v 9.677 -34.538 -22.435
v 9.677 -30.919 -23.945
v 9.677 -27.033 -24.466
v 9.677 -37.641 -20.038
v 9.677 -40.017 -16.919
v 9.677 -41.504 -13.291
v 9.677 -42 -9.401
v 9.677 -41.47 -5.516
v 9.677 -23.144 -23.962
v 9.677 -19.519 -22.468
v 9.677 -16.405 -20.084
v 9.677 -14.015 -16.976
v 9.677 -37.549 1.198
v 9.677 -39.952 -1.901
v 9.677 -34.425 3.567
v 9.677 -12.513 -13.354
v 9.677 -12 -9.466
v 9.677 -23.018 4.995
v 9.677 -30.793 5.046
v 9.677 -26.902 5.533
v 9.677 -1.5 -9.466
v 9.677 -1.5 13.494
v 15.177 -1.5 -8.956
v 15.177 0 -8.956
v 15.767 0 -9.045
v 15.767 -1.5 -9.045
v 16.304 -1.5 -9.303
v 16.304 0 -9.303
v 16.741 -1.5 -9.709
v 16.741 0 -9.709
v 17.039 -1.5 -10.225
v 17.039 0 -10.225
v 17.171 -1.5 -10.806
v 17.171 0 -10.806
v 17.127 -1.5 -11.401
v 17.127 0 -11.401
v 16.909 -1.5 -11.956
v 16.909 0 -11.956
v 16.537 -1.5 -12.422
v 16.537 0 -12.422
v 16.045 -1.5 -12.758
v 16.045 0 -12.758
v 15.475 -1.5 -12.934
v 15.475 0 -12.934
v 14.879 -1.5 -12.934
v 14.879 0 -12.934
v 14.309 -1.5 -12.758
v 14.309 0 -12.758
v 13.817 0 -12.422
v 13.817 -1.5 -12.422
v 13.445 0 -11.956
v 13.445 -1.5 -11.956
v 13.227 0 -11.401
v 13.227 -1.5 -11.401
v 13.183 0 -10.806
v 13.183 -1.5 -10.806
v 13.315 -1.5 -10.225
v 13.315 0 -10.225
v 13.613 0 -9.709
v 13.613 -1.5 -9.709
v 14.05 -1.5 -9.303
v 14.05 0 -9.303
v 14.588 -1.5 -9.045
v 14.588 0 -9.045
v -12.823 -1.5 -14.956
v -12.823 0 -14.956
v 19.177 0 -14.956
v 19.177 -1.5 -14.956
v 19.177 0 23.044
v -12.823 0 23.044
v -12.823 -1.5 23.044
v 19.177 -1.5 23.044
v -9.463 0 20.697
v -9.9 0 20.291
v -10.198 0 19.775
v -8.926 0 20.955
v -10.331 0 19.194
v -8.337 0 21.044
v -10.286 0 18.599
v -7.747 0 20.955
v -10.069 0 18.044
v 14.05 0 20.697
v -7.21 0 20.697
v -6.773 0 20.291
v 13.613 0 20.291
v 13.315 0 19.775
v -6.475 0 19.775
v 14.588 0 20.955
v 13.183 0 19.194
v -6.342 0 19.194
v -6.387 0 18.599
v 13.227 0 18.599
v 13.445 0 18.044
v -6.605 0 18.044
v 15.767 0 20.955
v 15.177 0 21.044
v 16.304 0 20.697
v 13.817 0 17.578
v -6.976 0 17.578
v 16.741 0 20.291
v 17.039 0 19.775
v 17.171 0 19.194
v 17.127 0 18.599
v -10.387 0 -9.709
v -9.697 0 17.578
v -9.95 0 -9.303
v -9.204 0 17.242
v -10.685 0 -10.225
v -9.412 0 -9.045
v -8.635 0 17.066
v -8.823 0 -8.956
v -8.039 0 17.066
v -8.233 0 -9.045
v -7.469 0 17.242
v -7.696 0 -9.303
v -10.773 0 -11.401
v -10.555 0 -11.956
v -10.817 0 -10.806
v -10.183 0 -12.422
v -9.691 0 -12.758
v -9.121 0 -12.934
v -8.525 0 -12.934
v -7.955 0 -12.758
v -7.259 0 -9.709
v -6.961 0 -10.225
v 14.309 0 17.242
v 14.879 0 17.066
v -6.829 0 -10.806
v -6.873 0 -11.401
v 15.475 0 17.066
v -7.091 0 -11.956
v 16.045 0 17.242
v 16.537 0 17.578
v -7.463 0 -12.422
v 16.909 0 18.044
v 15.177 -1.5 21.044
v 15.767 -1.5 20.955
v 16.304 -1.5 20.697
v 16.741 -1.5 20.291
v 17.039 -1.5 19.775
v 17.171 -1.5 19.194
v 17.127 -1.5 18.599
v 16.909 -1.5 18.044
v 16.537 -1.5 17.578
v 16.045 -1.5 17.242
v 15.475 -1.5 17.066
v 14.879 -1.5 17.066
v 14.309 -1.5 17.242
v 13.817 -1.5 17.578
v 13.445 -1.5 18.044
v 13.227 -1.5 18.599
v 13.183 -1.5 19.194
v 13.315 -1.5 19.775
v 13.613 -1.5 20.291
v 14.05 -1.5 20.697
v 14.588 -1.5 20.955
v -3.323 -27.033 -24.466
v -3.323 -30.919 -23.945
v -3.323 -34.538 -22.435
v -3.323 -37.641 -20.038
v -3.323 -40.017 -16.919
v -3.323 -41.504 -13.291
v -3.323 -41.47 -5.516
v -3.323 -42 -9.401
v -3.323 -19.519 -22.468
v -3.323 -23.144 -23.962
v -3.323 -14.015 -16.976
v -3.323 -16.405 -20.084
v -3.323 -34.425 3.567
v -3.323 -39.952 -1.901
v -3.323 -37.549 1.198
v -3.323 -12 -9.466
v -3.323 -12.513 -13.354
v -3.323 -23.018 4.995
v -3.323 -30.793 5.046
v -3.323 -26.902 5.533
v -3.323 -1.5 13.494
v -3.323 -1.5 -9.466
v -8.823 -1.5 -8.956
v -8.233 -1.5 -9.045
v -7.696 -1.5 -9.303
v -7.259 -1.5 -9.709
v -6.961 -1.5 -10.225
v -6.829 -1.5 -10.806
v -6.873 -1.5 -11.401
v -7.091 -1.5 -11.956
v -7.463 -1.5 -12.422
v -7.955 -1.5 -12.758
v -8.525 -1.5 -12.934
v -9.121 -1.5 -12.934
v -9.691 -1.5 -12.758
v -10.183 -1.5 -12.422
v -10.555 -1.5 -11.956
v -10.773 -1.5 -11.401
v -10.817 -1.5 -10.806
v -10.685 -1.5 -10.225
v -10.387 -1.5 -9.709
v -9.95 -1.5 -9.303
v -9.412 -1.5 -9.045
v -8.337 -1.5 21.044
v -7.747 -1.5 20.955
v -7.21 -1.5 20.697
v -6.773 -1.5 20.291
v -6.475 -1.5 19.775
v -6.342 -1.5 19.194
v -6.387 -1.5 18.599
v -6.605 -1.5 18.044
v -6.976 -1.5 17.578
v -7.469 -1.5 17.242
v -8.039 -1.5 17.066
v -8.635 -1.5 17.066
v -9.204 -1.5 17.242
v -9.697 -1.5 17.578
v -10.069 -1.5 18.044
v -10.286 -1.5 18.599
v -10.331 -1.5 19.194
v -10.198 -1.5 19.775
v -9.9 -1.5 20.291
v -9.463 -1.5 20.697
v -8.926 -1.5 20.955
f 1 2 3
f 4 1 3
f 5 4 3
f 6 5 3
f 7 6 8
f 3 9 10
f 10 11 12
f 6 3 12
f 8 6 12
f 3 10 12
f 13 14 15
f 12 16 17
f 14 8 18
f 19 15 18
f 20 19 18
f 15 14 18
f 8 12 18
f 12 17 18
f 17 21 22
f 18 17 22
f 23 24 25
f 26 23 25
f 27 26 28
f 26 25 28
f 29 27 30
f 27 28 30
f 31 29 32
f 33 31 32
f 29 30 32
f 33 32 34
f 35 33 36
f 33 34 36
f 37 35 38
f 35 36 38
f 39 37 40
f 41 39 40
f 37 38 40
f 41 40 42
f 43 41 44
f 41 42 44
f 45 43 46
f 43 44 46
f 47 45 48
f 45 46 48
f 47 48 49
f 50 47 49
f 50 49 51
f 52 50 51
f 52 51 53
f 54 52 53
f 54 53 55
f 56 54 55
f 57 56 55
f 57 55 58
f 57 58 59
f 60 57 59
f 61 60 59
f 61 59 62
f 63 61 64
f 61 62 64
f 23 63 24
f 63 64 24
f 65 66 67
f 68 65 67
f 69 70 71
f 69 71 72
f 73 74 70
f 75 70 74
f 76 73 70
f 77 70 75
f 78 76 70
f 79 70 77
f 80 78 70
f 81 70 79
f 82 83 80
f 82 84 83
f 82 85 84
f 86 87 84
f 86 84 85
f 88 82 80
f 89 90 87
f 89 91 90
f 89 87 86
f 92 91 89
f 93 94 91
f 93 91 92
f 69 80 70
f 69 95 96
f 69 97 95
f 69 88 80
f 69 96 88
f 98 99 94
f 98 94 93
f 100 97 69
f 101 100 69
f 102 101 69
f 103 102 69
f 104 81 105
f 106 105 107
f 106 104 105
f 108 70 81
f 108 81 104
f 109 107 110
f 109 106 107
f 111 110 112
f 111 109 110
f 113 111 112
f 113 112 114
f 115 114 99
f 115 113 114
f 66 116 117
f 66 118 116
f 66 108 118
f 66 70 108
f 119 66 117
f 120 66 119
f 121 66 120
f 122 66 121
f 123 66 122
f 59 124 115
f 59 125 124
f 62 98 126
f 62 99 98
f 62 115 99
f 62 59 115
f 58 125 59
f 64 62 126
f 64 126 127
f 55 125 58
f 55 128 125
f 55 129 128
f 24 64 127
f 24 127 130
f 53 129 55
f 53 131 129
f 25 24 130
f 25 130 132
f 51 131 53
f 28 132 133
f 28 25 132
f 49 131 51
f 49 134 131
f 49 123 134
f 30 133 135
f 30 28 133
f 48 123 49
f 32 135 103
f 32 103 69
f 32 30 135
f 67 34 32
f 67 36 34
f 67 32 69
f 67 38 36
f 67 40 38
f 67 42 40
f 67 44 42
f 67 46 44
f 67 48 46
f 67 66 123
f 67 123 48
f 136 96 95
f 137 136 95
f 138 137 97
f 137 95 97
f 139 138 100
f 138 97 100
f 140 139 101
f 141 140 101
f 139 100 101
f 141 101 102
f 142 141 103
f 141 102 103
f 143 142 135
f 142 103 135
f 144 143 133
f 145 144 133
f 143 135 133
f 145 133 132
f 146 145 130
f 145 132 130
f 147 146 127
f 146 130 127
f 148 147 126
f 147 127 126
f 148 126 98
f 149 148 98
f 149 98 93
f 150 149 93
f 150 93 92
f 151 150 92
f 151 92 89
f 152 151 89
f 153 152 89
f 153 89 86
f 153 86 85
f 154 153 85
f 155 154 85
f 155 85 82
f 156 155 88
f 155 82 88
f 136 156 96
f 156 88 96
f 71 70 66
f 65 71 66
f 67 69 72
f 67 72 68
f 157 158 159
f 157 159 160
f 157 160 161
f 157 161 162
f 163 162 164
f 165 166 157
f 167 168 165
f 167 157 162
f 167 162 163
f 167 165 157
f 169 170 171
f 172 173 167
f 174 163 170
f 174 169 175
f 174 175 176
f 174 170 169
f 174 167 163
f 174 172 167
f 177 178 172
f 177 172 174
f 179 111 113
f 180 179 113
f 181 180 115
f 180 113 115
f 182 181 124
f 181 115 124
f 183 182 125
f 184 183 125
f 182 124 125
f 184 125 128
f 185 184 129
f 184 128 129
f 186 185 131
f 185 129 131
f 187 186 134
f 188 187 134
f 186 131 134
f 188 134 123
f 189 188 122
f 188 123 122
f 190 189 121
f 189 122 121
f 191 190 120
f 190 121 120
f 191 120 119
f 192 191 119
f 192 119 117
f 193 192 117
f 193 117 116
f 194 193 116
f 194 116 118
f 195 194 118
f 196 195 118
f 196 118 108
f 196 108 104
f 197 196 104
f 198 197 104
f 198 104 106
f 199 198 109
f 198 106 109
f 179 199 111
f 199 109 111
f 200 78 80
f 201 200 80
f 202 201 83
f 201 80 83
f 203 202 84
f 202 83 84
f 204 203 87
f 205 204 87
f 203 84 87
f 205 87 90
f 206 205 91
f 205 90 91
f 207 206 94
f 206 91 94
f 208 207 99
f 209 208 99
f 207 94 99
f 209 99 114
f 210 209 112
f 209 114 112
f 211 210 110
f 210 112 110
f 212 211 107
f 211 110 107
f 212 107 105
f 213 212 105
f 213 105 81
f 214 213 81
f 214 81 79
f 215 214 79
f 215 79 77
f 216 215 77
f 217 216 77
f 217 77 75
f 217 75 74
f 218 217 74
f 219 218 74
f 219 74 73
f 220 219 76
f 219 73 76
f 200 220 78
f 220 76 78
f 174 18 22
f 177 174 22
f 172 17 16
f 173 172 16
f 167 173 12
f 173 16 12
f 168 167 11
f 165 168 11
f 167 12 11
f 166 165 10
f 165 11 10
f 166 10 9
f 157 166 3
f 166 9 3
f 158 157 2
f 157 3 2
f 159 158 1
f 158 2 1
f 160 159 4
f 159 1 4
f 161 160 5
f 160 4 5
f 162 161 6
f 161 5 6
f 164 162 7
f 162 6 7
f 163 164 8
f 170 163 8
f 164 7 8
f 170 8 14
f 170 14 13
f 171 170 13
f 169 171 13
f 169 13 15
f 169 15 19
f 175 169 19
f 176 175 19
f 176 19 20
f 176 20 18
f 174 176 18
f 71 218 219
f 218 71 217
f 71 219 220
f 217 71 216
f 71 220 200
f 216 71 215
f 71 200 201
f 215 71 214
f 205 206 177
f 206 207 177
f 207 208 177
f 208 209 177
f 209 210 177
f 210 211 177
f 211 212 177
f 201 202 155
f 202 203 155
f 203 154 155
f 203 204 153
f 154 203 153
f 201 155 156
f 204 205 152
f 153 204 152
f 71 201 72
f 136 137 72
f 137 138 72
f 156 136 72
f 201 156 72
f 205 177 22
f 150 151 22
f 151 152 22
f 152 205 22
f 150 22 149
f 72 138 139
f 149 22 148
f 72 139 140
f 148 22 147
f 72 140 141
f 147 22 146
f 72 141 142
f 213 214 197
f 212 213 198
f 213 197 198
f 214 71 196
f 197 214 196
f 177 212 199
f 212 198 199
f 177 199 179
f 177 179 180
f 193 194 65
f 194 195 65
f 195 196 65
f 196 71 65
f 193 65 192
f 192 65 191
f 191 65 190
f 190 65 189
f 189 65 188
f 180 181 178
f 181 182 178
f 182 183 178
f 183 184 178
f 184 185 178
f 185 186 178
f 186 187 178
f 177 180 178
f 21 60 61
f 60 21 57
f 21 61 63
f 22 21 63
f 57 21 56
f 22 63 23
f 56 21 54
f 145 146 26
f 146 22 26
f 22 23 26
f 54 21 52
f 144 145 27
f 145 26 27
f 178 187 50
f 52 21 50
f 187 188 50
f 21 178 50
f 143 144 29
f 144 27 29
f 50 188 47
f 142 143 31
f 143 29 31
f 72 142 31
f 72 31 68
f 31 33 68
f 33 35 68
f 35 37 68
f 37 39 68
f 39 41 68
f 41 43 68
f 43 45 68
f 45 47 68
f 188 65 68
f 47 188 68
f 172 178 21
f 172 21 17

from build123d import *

# Parameters (mm, degrees)
SKETCH1_W                = 32
SKETCH1_H                = 38
SKETCH1_R                = 2
BOSS_EXTRUDE1_DEPTH      = 1.5
BOSS_EXTRUDE2_DEPTH      = 6.5
BOSS_EXTRUDE2_DEPTH_BACK = 6.5
SKETCH2_R                = 15


with BuildPart() as part:
    # Sketch1 → Boss-Extrude1 (new body)
    with BuildSketch(Plane(origin=(0, 0, 0), x_dir=(1, 0, 0), z_dir=(0, 1, 0))):
        with Locations((3.177060701, -4.044161192)):
            Rectangle(SKETCH1_W, SKETCH1_H)
        with Locations(Location((-8.822939299, 10.955838808, 0), (0, 0, 270))):
            Circle(SKETCH1_R, mode=Mode.SUBTRACT)
        with Locations(Location((15.177060701, 10.955838808, 0), (0, 0, 270))):
            Circle(SKETCH1_R, mode=Mode.SUBTRACT)
        with Locations(Location((15.177060701, -19.044161192, 0), (0, 0, 270))):
            Circle(SKETCH1_R, mode=Mode.SUBTRACT)
        with Locations(Location((-8.33660746, -19.044161192, 0), (0, 0, 270))):
            Circle(SKETCH1_R, mode=Mode.SUBTRACT)
    extrude(amount=-BOSS_EXTRUDE1_DEPTH)

    # Sketch2 → Boss-Extrude2 (add, two sides: drawn at the far end of the back side and taken through both)
    with BuildSketch(Plane.ZY.offset(-3.177060701).offset(-BOSS_EXTRUDE2_DEPTH_BACK)):
        with Locations((-9.466353074, -27)):
            Circle(SKETCH2_R)
        with BuildLine():
            Line((13.494241004, -1.5), (-9.466353074, -1.5))
            Line((-9.466353074, -1.5), (-9.466353074, -12))
            ThreePointArc((-9.466353074, -12), (-0.375906326, -15.068370693), (4.99549237, -23.018162943))
            Line((4.99549237, -23.018162943), (13.494241004, -1.5))
        make_face()
    extrude(amount=BOSS_EXTRUDE2_DEPTH + BOSS_EXTRUDE2_DEPTH_BACK)


solid = part.part
